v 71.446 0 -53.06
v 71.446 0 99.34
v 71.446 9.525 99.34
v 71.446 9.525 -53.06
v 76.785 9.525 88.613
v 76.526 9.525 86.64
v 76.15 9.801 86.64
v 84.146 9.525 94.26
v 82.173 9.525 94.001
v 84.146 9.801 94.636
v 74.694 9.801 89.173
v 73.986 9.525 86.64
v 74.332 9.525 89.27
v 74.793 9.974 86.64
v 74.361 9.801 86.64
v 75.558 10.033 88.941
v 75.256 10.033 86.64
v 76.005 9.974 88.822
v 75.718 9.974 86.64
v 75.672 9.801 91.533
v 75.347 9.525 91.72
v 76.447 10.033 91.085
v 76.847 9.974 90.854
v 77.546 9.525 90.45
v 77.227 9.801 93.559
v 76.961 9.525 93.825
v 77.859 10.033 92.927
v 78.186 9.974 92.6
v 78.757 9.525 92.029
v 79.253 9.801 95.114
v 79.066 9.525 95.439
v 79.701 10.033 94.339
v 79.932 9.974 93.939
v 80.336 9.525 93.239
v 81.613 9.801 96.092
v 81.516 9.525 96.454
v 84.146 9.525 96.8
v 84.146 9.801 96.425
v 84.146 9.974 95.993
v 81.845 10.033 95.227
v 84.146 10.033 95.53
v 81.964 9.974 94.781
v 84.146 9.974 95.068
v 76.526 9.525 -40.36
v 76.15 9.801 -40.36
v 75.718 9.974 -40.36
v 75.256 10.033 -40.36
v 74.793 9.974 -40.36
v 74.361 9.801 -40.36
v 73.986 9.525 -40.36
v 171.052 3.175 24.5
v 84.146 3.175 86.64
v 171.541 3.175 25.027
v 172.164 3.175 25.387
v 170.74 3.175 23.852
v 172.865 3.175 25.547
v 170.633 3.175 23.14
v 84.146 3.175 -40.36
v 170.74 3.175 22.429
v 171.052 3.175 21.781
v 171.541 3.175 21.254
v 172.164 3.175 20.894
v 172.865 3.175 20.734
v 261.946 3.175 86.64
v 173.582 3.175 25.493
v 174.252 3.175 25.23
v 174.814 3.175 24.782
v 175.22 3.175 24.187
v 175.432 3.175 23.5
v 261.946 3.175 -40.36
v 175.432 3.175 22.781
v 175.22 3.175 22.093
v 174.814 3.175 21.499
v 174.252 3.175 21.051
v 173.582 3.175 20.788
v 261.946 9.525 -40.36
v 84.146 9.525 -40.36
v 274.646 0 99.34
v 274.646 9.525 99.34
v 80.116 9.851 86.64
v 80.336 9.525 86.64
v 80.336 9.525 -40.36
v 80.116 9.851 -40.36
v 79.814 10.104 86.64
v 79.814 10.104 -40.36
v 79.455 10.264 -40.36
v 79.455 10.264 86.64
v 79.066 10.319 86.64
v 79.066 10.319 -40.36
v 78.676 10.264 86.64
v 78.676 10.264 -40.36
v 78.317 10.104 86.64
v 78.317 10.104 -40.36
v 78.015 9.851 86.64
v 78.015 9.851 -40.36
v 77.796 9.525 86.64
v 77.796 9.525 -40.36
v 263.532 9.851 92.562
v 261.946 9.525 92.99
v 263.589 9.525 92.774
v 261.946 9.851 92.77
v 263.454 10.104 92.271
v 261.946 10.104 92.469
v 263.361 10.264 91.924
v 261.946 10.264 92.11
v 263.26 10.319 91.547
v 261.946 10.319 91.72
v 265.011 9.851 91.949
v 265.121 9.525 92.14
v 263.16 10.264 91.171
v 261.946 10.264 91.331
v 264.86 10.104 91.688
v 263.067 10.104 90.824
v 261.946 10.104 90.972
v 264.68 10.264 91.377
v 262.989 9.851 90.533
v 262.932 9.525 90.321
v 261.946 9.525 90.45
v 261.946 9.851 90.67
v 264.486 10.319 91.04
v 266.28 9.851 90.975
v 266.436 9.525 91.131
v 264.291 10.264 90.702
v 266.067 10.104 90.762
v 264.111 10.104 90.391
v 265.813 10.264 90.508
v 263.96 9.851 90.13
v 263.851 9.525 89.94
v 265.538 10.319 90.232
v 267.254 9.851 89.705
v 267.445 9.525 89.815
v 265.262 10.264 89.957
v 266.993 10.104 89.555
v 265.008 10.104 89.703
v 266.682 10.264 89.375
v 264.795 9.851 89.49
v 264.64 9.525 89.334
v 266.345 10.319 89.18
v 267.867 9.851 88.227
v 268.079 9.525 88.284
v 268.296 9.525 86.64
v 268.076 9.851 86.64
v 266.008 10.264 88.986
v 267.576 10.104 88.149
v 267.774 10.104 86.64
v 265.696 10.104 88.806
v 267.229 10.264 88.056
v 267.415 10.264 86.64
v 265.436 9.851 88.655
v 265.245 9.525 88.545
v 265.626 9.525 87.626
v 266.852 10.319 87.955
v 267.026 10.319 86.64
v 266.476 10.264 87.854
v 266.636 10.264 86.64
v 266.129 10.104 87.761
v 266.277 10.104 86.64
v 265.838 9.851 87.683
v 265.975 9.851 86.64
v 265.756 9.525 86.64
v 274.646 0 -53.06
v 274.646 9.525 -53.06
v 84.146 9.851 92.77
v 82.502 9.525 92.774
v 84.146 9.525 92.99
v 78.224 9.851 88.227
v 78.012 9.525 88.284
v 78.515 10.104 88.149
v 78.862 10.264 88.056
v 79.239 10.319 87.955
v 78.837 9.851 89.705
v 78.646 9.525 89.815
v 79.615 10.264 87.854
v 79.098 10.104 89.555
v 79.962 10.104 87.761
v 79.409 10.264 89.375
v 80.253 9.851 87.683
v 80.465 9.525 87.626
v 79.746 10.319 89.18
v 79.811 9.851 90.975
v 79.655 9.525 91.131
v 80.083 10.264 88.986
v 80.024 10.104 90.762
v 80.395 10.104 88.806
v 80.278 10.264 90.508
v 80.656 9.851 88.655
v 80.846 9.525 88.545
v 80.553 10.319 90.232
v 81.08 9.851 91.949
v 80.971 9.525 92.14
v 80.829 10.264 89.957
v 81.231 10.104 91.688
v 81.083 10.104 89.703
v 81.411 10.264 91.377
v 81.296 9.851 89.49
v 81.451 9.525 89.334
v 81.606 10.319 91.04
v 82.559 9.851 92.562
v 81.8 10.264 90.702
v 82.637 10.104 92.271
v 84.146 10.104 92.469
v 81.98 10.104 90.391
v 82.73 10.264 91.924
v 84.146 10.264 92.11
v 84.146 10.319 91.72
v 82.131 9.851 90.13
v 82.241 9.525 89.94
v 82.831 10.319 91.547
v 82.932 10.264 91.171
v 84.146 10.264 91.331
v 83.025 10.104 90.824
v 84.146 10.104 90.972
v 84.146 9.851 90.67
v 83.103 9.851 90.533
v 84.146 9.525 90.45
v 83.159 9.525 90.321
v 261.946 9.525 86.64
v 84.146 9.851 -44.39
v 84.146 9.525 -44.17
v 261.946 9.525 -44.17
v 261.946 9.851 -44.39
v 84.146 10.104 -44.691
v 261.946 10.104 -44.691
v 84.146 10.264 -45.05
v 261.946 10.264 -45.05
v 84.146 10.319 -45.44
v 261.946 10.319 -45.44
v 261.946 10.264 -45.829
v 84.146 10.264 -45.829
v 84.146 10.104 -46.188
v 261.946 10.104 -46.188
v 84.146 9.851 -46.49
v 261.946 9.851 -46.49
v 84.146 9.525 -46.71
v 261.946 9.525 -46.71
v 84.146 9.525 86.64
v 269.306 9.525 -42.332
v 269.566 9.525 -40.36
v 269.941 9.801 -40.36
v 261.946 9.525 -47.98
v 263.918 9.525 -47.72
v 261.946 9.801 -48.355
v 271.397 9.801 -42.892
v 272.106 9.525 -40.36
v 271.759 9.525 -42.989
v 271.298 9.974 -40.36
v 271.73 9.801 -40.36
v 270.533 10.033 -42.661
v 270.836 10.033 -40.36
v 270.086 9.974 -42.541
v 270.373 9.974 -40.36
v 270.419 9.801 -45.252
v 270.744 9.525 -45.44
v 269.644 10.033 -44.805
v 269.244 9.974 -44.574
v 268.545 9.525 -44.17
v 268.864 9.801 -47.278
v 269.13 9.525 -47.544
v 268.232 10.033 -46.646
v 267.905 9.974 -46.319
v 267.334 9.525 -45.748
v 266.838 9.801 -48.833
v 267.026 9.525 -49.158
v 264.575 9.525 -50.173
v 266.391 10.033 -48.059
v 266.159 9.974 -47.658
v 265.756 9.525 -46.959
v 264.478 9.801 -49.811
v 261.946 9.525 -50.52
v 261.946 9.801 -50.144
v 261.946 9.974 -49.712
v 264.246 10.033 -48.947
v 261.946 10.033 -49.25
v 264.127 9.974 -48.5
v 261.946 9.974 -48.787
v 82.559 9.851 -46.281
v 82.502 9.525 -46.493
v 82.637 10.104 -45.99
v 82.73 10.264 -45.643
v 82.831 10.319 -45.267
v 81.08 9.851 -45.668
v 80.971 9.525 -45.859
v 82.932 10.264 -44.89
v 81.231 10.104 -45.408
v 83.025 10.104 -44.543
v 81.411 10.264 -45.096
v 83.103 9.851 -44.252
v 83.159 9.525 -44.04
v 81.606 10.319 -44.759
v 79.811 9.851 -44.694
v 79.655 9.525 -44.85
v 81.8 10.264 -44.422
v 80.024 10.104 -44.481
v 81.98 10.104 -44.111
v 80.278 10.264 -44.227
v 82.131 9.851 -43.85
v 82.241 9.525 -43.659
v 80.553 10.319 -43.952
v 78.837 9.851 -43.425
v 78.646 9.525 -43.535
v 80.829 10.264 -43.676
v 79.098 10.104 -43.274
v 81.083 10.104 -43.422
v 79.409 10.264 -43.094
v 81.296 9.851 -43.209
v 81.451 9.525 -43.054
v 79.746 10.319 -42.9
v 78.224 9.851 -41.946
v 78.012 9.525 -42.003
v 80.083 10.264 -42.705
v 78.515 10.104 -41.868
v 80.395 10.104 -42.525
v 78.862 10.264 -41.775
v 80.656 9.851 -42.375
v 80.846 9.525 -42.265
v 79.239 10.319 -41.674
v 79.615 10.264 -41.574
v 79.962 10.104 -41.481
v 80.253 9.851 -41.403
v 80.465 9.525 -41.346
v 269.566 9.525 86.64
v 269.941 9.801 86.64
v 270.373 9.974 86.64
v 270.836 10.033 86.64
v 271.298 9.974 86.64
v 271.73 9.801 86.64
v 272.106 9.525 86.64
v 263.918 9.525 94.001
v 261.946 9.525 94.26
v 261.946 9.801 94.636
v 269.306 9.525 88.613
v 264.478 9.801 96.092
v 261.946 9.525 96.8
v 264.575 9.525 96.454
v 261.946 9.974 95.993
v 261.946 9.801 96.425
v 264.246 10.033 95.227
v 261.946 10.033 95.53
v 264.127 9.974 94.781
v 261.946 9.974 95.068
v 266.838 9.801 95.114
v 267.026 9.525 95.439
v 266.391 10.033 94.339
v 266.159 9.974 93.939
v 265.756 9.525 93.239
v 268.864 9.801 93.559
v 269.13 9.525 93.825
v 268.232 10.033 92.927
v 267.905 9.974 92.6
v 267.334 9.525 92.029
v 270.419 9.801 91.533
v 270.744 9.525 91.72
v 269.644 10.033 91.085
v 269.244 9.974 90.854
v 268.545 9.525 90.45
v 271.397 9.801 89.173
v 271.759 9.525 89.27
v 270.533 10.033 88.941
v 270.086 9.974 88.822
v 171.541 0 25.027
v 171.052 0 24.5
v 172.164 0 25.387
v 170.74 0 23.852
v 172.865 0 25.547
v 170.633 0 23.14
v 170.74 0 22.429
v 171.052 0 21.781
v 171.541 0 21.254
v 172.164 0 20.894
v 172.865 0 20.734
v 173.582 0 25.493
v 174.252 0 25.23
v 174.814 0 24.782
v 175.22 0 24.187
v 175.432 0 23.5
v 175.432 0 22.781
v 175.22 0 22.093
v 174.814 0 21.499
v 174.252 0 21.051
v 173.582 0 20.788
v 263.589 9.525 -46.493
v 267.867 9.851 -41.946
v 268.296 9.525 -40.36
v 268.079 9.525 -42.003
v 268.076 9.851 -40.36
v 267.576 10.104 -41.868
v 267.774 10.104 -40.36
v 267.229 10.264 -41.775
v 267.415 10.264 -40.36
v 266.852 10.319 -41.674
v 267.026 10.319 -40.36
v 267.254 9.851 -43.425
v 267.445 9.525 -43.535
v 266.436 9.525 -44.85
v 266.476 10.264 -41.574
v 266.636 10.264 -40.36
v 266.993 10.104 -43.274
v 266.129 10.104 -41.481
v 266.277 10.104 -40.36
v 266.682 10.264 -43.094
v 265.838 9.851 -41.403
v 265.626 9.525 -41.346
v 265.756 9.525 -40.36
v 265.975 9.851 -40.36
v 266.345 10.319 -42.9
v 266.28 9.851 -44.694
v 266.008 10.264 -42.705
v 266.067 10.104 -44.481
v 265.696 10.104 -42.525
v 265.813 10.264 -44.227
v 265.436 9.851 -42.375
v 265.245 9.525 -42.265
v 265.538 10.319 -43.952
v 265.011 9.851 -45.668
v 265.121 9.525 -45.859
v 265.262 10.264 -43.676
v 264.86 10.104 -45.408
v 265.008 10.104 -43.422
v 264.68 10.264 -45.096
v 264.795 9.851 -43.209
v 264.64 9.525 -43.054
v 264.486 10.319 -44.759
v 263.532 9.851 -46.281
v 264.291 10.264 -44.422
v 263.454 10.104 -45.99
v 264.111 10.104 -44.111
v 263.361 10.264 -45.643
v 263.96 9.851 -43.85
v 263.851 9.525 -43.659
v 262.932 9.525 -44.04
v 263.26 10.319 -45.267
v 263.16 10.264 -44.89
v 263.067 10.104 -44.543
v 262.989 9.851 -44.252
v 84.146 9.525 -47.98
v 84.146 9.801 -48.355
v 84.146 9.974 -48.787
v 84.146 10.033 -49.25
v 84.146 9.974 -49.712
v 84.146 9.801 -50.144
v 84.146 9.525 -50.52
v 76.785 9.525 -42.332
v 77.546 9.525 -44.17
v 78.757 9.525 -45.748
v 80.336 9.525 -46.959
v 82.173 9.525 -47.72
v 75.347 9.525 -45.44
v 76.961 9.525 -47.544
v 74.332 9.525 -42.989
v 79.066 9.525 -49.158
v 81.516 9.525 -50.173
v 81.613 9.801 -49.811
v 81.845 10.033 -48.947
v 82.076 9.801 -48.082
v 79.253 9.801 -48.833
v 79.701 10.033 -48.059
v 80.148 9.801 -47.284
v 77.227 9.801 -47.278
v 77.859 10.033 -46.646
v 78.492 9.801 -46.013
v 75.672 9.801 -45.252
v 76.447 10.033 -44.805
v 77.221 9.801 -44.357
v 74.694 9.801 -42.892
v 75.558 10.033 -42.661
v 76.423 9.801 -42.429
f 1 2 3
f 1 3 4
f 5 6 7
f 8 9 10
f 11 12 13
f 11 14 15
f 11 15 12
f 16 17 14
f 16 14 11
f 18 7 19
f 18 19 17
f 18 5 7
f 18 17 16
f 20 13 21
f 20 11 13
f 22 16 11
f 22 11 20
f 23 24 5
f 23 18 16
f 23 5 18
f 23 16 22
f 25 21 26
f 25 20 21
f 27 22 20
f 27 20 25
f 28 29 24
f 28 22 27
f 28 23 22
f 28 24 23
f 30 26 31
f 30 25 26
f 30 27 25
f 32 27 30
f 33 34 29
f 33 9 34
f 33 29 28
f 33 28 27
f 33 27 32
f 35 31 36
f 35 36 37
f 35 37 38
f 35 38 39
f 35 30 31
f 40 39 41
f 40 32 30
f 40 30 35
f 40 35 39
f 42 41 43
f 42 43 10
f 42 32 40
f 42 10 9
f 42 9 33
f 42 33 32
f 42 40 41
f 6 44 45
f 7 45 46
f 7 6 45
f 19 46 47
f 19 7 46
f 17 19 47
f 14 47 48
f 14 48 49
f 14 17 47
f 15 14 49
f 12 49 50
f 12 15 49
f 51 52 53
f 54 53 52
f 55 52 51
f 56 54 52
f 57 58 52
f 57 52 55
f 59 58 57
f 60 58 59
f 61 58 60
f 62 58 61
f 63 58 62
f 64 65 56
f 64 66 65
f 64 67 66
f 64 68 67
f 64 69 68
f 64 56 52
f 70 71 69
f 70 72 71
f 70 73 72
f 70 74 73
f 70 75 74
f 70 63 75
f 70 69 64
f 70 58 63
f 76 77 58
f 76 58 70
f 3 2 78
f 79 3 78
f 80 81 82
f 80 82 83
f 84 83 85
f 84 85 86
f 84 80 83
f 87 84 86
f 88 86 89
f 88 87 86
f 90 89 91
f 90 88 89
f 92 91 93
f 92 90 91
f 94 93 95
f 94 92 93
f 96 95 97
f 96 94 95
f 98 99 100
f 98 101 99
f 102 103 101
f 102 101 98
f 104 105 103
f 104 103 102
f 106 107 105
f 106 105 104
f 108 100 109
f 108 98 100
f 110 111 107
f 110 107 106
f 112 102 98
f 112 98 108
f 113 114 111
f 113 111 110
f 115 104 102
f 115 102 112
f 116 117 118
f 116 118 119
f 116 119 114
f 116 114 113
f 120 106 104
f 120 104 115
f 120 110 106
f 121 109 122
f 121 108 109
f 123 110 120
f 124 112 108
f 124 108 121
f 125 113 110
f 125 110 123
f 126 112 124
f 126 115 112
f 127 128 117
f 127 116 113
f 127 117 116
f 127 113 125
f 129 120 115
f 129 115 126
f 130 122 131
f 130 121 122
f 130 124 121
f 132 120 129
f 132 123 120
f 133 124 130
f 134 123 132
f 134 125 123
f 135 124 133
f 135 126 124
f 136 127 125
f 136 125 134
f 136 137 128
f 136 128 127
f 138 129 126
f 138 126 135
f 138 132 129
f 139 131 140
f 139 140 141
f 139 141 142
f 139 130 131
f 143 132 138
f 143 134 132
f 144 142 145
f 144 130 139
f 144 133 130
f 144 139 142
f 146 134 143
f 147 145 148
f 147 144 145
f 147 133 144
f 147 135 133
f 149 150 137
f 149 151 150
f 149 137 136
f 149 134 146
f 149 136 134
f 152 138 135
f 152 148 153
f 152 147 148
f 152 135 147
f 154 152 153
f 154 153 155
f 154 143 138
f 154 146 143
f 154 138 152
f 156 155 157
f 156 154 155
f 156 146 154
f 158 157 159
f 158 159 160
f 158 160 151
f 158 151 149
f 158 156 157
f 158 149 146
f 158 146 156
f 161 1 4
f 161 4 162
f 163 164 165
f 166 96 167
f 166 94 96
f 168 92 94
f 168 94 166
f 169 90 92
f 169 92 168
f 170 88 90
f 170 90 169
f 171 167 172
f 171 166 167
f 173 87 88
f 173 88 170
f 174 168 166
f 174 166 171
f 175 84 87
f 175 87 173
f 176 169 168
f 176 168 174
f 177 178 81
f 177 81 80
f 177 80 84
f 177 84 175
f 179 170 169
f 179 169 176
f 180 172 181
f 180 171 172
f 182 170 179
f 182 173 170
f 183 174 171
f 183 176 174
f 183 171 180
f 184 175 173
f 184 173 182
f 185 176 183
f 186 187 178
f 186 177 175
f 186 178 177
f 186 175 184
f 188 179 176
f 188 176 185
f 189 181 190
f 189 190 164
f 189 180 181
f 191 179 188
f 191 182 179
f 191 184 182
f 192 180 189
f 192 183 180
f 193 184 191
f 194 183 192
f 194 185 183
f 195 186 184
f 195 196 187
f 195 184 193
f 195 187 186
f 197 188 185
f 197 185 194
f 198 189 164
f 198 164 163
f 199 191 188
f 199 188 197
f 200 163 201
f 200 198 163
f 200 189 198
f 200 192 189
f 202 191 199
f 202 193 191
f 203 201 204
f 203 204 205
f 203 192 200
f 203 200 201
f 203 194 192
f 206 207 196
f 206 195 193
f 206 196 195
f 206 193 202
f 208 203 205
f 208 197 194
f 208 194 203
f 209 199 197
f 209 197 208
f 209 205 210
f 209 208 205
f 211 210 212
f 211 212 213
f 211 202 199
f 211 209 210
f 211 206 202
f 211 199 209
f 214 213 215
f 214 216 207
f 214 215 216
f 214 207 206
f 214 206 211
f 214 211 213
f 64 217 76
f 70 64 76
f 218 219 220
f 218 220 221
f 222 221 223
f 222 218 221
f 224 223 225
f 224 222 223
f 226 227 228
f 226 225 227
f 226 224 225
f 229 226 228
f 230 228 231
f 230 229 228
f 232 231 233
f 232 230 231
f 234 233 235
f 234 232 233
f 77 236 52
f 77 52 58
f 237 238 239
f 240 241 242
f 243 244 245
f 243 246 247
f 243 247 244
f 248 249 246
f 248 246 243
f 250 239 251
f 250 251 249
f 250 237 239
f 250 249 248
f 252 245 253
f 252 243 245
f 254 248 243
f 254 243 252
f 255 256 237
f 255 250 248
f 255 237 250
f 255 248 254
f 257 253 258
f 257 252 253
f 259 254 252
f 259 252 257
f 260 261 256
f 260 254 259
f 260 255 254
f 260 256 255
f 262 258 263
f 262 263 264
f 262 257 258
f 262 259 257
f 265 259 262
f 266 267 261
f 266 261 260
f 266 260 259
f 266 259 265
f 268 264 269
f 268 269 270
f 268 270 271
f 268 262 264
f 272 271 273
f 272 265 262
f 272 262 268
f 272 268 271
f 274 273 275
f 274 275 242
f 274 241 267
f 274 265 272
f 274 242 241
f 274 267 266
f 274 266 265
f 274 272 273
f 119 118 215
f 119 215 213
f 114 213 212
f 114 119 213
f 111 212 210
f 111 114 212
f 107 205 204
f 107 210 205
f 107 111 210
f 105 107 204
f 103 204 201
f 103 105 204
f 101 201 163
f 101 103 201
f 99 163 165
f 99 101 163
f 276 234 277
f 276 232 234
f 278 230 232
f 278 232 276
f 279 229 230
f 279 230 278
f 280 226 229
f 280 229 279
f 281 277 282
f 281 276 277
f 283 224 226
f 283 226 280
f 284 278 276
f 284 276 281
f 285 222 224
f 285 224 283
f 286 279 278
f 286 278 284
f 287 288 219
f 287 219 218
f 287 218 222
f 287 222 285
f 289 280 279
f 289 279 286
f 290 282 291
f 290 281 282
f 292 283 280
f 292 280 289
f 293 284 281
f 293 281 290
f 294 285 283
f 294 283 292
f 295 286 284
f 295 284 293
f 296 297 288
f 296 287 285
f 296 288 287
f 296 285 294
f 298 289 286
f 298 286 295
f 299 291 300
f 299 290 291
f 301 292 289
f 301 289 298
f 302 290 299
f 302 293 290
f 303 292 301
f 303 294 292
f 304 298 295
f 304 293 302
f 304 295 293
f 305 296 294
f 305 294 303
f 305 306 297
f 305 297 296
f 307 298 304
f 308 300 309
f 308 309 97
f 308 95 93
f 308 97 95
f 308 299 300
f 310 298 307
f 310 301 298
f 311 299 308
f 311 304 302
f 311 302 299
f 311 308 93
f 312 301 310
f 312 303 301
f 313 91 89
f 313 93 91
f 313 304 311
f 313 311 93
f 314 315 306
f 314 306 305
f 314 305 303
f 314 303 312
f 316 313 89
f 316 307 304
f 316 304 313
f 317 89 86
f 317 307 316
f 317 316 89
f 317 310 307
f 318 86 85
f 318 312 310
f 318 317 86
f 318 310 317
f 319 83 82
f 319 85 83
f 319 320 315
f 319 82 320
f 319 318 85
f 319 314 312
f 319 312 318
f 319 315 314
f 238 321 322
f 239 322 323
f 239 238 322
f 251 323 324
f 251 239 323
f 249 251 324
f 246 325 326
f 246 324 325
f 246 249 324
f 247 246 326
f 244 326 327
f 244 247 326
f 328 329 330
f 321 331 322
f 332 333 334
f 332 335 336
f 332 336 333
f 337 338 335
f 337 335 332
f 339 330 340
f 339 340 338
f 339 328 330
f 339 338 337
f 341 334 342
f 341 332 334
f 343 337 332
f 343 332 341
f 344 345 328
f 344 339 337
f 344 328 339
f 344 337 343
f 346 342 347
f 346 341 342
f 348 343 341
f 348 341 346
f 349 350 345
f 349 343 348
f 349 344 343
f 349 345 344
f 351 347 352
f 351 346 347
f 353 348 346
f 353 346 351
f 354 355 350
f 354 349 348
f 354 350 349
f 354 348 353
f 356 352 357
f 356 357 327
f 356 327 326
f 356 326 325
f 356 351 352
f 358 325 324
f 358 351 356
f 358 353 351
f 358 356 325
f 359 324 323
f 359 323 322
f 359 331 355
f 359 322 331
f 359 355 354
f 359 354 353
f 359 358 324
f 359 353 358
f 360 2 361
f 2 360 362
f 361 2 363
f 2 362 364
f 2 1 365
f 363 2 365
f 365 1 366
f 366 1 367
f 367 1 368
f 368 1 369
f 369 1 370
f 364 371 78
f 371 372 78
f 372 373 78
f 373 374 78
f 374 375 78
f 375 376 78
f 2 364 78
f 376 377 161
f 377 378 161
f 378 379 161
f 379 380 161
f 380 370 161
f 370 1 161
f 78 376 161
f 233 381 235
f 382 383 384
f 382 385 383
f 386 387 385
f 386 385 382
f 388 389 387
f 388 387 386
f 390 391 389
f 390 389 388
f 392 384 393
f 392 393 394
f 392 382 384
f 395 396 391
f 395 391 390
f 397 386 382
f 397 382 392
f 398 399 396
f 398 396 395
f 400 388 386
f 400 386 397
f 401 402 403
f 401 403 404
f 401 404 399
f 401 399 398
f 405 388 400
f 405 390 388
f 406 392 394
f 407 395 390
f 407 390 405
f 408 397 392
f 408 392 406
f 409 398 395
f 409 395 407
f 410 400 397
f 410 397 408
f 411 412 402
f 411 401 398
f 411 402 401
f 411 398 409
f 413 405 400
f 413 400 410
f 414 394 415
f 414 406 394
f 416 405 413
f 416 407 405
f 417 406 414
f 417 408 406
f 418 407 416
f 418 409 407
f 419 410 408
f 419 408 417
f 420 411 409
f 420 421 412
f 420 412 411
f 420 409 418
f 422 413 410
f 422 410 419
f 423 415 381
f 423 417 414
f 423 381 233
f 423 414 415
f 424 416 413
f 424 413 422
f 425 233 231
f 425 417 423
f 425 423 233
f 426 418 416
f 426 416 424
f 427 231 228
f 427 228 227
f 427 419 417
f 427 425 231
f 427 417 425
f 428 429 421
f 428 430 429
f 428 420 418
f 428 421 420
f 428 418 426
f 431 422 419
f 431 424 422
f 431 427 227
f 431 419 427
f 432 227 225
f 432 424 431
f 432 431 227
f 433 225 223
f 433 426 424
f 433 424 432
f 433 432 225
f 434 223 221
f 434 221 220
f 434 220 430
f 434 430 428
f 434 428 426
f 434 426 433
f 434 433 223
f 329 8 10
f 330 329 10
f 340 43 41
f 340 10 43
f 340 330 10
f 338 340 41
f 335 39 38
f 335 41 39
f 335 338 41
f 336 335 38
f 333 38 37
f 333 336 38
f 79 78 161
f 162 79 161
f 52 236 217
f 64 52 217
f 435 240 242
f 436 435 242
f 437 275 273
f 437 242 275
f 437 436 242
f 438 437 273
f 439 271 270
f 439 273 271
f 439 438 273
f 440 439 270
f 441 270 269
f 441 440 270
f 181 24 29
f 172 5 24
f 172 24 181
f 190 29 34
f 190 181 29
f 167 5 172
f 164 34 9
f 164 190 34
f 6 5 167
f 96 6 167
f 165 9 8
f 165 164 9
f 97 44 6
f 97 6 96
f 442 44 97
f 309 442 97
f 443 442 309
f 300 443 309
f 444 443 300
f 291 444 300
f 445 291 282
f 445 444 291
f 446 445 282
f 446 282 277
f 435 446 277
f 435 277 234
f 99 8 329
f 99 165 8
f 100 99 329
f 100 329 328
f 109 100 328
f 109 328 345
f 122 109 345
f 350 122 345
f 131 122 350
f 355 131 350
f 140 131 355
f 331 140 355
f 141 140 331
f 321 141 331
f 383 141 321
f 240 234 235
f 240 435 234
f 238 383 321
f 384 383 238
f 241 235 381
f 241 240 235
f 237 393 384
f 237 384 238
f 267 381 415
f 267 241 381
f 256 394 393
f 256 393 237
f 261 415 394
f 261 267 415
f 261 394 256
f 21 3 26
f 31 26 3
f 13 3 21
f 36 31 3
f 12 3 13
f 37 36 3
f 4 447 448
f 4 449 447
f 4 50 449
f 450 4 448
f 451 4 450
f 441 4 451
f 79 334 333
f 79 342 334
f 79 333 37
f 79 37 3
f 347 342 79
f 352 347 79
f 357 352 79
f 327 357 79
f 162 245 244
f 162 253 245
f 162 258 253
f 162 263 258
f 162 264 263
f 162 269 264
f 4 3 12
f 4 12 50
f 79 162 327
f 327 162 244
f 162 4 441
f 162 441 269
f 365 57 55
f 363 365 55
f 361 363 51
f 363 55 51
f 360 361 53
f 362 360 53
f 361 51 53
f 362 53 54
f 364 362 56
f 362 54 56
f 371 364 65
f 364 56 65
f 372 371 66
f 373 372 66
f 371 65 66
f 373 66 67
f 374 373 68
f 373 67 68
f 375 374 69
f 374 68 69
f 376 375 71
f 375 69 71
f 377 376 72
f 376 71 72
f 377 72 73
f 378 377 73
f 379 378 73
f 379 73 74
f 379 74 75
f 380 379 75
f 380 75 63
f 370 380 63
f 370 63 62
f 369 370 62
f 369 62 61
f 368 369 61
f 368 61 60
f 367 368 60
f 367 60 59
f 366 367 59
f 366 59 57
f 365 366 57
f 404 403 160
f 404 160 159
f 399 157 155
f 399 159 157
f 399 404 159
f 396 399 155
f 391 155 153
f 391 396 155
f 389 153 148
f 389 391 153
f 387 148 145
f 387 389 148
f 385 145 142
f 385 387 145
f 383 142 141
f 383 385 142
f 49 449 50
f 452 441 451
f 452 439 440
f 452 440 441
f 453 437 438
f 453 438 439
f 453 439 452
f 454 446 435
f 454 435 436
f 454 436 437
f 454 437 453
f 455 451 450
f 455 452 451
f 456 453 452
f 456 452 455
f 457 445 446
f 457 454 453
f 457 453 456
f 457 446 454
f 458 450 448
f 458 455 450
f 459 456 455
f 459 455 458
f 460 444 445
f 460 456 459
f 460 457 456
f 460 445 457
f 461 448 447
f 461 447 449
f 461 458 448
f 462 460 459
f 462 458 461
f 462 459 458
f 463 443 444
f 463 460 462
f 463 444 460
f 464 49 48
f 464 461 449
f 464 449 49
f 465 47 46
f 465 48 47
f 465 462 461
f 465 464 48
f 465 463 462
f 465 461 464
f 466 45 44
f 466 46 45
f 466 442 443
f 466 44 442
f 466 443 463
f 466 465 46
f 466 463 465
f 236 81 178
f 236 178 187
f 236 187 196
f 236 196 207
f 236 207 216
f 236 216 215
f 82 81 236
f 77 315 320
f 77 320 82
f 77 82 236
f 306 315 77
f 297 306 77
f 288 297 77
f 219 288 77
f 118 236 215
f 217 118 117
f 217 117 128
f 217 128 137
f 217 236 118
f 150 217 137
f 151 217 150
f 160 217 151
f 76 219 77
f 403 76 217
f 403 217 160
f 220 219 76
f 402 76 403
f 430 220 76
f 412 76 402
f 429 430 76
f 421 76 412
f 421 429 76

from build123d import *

# Parameters (mm, degrees)
SKETCH1_W              = 203.2
SKETCH1_H              = 152.4
MAIN_BODY_DEPTH        = 9.525
SKETCH2_W              = 177.8
SKETCH2_H              = 127
SLIDE_INSET_DEPTH      = 6.35
F_10_32_TAPPED_HOLE2_D = 4.826


with BuildPart() as part:
    # Sketch1 → main body (new body)
    with BuildSketch(Plane(origin=(0, 0, 0), x_dir=(1, 0, 0), z_dir=(0, 1, 0))):
        with Locations((173.045515995, -23.140372536)):
            Rectangle(SKETCH1_W, SKETCH1_H)
    extrude(amount=MAIN_BODY_DEPTH)

    # Sketch2 → slide inset (cut)
    with BuildSketch(Plane(origin=(0, 9.525, 0), x_dir=(1, 0, 0), z_dir=(0, 1, 0))):
        with Locations((173.045515995, -23.140372536)):
            Rectangle(SKETCH2_W, SKETCH2_H)
    extrude(amount=-SLIDE_INSET_DEPTH, mode=Mode.SUBTRACT)

    # Sweep for sealing ribs: sweep along a path in gasket bump profiles
    with BuildLine(Plane(origin=(0, 9.525, 0), x_dir=(1, 0, 0), z_dir=(0, 1, 0))) as sweep_for_sealing_ribs_path:
        Line((79.065515995, 40.359627464), (79.065515995, -86.640372536))
        ThreePointArc((79.065515995, -86.640372536), (80.553413547, -90.232474985), (84.145515995, -91.720372536))
        Line((84.145515995, -91.720372536), (261.945515995, -91.720372536))
        ThreePointArc((261.945515995, -91.720372536), (265.537618444, -90.232474985), (267.025515995, -86.640372536))
        Line((267.025515995, -86.640372536), (267.025515995, 40.359627464))
        ThreePointArc((267.025515995, 40.359627464), (265.537618444, 43.951729912), (261.945515995, 45.439627464))
        Line((261.945515995, 45.439627464), (84.145515995, 45.439627464))
        ThreePointArc((84.145515995, 45.439627464), (80.553413547, 43.951729912), (79.065515995, 40.359627464))
    # gasket bump shape → Sweep for sealing ribs (sweep)
    with BuildSketch(Plane(origin=(0, 0, 23.140372536), x_dir=(-1, 0, 0), z_dir=(0, 0, -1))):
        with BuildLine():
            Line((-77.795515995, 9.525), (-80.335515995, 9.525))
            ThreePointArc((-80.335515995, 9.525), (-79.065515995, 10.31875), (-77.795515995, 9.525))
        make_face()
        with BuildLine():
            Line((-76.525515995, 9.525), (-73.985515995, 9.525))
            ThreePointArc((-73.985515995, 9.525), (-75.255515995, 10.033), (-76.525515995, 9.525))
        make_face()
    sweep(path=sweep_for_sealing_ribs_path.line)

    # #10-32 Tapped Hole2 (through all)
    with Locations(Plane.XZ):
        with Locations((173.045515995, 23.140372536)):
            Hole(F_10_32_TAPPED_HOLE2_D / 2)


solid = part.part
